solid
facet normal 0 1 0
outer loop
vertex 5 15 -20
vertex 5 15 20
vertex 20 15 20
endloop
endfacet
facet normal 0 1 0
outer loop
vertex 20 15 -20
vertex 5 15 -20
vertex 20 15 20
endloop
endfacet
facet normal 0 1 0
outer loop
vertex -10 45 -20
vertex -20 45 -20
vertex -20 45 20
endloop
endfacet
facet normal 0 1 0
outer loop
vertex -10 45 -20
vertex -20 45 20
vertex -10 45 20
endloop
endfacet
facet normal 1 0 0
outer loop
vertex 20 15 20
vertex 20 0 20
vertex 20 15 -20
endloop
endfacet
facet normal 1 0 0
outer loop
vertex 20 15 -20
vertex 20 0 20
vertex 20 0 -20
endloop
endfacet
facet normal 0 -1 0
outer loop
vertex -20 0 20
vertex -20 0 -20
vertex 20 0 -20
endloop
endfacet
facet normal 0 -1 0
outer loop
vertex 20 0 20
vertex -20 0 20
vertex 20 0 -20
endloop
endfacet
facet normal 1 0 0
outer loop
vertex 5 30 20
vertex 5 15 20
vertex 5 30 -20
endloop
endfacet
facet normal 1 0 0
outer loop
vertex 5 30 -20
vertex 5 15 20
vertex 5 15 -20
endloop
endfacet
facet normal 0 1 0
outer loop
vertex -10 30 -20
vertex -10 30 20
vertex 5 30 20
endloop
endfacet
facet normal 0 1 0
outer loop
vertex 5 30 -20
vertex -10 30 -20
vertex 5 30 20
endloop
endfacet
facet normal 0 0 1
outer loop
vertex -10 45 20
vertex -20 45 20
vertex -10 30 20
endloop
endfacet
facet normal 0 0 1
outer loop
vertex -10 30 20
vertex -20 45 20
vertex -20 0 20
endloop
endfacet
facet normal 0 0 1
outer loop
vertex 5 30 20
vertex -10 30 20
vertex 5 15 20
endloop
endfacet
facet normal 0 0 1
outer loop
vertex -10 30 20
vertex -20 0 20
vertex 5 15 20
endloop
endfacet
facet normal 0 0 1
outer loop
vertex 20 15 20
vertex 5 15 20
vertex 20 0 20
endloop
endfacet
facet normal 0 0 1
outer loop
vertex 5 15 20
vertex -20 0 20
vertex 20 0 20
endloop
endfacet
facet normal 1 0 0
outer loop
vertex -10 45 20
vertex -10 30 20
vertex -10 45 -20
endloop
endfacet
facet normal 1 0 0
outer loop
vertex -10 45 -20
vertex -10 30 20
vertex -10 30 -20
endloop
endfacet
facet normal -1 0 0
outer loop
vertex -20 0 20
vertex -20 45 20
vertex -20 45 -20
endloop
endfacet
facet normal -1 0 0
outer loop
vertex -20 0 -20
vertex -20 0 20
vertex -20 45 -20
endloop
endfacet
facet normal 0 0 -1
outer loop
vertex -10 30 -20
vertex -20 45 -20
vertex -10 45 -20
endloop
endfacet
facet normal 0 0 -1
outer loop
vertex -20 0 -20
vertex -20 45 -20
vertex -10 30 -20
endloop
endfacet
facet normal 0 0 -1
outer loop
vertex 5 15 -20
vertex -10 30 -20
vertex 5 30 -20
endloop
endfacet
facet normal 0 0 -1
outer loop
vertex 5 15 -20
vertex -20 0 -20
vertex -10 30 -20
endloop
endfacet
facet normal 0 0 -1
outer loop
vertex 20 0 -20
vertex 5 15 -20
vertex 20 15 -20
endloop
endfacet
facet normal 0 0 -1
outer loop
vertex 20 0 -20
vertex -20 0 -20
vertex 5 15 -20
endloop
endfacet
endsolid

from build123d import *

# Parameters (mm, degrees)
SKETCH_1_W      = 40
SKETCH_1_H      = 40
EXTRUDE_1_DEPTH = 15
SKETCH_2_W      = 25
SKETCH_2_H      = 40
EXTRUDE_2_DEPTH = 15
SKETCH_3_W      = 10
SKETCH_3_H      = 40
EXTRUDE_3_DEPTH = 15


with BuildPart() as part:
    # 草圖1 → 填料-伸長1 (new body)
    with BuildSketch(Plane(origin=(0, 0, 0), x_dir=(1, 0, 0), z_dir=(0, 1, 0))):
        Rectangle(SKETCH_1_W, SKETCH_1_H)
    extrude(amount=EXTRUDE_1_DEPTH)

    # 草圖2 → 填料-伸長2 (add)
    with BuildSketch(Plane(origin=(0, 15, 0), x_dir=(1, 0, 0), z_dir=(0, 1, 0))):
        with Locations((-7.5, 0)):
            Rectangle(SKETCH_2_W, SKETCH_2_H)
    extrude(amount=EXTRUDE_2_DEPTH)

    # 草圖3 → 填料-伸長3 (add)
    with BuildSketch(Plane(origin=(0, 30, 0), x_dir=(1, 0, 0), z_dir=(0, 1, 0))):
        with Locations((-15, 0)):
            Rectangle(SKETCH_3_W, SKETCH_3_H)
    extrude(amount=EXTRUDE_3_DEPTH)


solid = part.part
